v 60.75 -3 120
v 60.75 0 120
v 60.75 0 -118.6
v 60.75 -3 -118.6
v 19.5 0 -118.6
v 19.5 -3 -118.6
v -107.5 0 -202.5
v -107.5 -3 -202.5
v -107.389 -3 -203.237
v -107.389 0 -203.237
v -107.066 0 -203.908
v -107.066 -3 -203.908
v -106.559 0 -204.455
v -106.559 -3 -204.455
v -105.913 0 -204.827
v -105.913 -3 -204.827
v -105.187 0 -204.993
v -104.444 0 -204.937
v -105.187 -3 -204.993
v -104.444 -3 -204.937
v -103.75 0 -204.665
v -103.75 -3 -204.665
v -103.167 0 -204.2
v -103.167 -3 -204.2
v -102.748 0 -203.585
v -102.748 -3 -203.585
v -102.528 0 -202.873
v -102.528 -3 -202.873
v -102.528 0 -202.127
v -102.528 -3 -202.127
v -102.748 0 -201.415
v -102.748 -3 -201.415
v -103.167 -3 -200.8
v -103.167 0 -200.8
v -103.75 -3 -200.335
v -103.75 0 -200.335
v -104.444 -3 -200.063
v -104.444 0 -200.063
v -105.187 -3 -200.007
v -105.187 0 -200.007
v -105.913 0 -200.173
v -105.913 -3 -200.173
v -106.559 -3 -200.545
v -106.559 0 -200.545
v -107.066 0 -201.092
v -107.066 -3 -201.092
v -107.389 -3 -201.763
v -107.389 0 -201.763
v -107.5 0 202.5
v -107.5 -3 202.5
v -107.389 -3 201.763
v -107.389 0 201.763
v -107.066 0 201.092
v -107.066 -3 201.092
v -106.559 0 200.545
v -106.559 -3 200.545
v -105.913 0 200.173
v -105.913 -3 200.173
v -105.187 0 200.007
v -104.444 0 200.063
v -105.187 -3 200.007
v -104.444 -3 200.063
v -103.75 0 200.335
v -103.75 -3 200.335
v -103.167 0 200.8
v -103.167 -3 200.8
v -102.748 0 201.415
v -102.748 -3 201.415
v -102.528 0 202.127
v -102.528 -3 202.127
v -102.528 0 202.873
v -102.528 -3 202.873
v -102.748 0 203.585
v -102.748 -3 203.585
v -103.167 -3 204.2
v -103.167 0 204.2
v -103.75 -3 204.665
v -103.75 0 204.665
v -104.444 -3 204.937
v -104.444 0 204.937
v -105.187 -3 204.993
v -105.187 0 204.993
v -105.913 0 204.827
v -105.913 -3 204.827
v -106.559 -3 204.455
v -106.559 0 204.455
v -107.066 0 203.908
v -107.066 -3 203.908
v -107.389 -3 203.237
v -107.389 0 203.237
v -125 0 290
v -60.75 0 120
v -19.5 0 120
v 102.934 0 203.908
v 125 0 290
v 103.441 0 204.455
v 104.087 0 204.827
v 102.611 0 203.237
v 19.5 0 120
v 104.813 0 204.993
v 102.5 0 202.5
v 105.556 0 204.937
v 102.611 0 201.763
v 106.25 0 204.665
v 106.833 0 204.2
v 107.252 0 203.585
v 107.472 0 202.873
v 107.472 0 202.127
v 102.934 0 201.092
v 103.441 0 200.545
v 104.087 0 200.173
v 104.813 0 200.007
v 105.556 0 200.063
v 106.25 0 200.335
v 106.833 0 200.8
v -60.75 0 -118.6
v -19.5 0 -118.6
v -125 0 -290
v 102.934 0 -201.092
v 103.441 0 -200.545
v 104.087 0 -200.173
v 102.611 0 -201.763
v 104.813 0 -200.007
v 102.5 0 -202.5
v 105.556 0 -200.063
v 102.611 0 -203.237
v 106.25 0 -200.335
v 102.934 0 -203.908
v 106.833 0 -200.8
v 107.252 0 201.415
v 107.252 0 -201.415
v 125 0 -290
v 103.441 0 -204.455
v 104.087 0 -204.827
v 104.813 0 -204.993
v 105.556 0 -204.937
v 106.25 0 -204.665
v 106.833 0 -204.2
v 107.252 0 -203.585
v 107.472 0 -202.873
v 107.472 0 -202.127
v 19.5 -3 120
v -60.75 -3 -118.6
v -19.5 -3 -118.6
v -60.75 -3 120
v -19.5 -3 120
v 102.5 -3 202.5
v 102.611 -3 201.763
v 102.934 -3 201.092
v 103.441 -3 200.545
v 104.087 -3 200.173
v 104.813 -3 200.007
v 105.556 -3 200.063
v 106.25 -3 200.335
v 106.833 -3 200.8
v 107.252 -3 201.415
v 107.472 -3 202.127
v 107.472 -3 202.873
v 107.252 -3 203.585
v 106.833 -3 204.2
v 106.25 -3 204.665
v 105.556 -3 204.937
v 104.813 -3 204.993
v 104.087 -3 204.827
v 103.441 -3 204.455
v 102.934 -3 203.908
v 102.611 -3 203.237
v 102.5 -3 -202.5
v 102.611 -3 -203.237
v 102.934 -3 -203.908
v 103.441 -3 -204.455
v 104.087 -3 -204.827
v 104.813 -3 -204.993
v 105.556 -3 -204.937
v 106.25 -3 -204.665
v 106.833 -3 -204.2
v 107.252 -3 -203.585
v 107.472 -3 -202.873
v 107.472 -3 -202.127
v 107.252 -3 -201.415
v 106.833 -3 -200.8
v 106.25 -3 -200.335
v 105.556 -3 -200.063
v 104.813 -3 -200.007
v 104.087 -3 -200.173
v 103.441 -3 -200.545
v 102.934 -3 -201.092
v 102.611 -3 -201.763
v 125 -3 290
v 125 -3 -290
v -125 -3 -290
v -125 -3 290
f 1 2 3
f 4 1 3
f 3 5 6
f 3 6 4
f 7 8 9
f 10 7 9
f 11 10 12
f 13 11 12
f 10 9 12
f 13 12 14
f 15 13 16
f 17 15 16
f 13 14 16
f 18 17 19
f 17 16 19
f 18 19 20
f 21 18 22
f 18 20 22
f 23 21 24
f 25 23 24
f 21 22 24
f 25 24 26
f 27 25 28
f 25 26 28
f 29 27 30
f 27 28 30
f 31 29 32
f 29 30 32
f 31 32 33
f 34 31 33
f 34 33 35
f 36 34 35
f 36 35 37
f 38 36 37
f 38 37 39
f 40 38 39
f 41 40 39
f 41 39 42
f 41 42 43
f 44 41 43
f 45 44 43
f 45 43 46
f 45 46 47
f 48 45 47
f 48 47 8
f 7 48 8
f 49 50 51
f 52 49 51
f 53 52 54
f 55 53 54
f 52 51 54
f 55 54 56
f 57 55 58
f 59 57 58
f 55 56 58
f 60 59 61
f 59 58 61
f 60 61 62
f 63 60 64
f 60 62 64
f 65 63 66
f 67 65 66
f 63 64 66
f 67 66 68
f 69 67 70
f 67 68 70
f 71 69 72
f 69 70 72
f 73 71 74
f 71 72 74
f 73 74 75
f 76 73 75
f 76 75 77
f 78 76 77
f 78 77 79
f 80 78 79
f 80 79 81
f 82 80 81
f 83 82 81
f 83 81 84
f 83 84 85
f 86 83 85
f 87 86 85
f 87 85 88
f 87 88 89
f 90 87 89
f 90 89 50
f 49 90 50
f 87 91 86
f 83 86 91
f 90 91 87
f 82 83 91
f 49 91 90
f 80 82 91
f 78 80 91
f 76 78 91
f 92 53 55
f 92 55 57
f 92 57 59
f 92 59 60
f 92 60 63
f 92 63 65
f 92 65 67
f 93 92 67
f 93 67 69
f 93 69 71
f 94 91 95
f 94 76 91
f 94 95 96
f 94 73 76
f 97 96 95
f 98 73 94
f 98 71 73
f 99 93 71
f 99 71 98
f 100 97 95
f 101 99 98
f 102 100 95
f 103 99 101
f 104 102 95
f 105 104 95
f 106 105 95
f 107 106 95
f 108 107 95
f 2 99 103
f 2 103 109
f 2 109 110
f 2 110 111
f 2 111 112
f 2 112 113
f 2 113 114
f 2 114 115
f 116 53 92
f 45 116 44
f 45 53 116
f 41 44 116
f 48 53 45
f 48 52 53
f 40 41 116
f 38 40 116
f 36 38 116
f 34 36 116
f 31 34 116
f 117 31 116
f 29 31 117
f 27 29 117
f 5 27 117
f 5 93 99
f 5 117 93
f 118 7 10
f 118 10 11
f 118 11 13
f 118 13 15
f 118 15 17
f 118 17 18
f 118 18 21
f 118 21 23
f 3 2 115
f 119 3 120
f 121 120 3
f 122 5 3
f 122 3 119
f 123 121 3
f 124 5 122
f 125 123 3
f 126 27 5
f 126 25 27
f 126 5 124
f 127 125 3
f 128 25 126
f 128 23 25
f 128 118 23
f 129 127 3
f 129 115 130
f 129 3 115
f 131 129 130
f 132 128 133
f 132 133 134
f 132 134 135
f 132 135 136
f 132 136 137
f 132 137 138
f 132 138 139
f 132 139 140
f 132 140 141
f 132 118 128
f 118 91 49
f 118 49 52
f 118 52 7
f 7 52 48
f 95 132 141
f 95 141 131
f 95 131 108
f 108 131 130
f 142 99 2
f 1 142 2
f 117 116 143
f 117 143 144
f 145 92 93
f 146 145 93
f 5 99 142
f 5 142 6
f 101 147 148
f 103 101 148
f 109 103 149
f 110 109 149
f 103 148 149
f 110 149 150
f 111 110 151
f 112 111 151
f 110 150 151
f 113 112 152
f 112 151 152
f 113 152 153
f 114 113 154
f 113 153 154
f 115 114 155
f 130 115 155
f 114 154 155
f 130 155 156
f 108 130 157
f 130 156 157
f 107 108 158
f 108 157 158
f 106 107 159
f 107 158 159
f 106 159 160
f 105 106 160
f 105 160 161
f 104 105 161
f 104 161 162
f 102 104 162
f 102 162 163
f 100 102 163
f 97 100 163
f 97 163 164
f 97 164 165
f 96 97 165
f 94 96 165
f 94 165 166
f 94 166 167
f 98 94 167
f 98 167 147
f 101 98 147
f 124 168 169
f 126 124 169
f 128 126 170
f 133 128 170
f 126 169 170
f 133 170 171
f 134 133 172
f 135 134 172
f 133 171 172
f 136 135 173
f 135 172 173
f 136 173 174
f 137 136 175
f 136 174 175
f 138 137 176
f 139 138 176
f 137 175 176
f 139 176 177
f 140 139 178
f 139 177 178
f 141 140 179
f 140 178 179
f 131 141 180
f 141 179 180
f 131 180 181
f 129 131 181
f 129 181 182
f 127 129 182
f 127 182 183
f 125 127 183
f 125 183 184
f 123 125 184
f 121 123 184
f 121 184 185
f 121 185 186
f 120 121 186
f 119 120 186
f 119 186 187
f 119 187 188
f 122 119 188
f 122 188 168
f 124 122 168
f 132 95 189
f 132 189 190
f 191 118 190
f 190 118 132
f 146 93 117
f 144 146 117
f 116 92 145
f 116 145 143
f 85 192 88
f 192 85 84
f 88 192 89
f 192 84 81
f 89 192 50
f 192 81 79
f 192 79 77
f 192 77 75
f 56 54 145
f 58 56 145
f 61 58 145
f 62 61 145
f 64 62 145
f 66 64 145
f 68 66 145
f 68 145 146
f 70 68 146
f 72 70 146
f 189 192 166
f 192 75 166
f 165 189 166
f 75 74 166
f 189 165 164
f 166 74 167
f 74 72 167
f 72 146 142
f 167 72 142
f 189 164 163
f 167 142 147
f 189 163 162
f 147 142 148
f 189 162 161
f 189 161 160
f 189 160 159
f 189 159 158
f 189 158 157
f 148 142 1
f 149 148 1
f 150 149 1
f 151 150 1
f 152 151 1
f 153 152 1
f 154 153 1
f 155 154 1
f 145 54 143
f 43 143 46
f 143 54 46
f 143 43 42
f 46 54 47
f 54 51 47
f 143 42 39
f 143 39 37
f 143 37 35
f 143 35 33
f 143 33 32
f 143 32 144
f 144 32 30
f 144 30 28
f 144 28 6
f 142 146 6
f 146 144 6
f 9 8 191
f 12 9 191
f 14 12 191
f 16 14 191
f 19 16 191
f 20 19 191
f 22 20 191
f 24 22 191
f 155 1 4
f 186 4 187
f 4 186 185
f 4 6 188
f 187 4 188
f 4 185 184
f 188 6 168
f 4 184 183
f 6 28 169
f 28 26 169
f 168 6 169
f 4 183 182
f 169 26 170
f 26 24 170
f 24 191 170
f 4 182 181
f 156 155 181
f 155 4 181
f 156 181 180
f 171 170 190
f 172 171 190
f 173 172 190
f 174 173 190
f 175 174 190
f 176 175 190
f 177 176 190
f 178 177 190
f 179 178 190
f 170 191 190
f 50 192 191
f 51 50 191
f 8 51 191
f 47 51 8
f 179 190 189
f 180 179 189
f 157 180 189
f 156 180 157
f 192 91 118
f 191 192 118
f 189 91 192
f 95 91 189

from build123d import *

# Parameters (mm, degrees)
SKETCH1_W                = 230
SKETCH1_H                = 425
BOSS_EXTRUDE1_DEPTH      = 3
F_5_0_4_DIAMETER_HOLE1_D = 5
SKETCH5_W                = 41.25
SKETCH5_H                = 238.6
CUT_EXTRUDE1_DEPTH       = 4
SKETCH6_W                = 250
SKETCH6_H                = 580
SKETCH6_W_2              = 230
SKETCH6_H_2              = 425
BOSS_EXTRUDE3_DEPTH      = 3


with BuildPart() as part:
    # Sketch1 → Boss-Extrude1 (new body)
    with BuildSketch(Plane(origin=(0, 0, 0), x_dir=(1, 0, 0), z_dir=(0, 1, 0))):
        Rectangle(SKETCH1_W, SKETCH1_H)
    extrude(amount=-BOSS_EXTRUDE1_DEPTH)

    # Ø5.0 (4) Diameter Hole1 (through all)
    with Locations(Plane(origin=(0, 0, 0), x_dir=(1, 0, 0), z_dir=(0, 1, 0))):
        with Locations((-105, 202.5), (105, 202.5), (105, -202.5), (-105, -202.5)):
            Hole(F_5_0_4_DIAMETER_HOLE1_D / 2)

    # Sketch5 → Cut-Extrude1 (cut, through all)
    with BuildSketch(Plane(origin=(0, 0, 0), x_dir=(1, 0, 0), z_dir=(0, 1, 0))):
        with Locations((-40.125, -0.7)):
            Rectangle(SKETCH5_W, SKETCH5_H)
        with Locations((40.125, -0.7)):
            Rectangle(SKETCH5_W, SKETCH5_H)
    extrude(amount=-CUT_EXTRUDE1_DEPTH, mode=Mode.SUBTRACT)

    # Sketch6 → Boss-Extrude3 (add)
    with BuildSketch(Plane(origin=(0, 0, 0), x_dir=(1, 0, 0), z_dir=(0, 1, 0))):
        Rectangle(SKETCH6_W, SKETCH6_H)
        Rectangle(SKETCH6_W_2, SKETCH6_H_2, mode=Mode.SUBTRACT)
    extrude(amount=-BOSS_EXTRUDE3_DEPTH)


solid = part.part
